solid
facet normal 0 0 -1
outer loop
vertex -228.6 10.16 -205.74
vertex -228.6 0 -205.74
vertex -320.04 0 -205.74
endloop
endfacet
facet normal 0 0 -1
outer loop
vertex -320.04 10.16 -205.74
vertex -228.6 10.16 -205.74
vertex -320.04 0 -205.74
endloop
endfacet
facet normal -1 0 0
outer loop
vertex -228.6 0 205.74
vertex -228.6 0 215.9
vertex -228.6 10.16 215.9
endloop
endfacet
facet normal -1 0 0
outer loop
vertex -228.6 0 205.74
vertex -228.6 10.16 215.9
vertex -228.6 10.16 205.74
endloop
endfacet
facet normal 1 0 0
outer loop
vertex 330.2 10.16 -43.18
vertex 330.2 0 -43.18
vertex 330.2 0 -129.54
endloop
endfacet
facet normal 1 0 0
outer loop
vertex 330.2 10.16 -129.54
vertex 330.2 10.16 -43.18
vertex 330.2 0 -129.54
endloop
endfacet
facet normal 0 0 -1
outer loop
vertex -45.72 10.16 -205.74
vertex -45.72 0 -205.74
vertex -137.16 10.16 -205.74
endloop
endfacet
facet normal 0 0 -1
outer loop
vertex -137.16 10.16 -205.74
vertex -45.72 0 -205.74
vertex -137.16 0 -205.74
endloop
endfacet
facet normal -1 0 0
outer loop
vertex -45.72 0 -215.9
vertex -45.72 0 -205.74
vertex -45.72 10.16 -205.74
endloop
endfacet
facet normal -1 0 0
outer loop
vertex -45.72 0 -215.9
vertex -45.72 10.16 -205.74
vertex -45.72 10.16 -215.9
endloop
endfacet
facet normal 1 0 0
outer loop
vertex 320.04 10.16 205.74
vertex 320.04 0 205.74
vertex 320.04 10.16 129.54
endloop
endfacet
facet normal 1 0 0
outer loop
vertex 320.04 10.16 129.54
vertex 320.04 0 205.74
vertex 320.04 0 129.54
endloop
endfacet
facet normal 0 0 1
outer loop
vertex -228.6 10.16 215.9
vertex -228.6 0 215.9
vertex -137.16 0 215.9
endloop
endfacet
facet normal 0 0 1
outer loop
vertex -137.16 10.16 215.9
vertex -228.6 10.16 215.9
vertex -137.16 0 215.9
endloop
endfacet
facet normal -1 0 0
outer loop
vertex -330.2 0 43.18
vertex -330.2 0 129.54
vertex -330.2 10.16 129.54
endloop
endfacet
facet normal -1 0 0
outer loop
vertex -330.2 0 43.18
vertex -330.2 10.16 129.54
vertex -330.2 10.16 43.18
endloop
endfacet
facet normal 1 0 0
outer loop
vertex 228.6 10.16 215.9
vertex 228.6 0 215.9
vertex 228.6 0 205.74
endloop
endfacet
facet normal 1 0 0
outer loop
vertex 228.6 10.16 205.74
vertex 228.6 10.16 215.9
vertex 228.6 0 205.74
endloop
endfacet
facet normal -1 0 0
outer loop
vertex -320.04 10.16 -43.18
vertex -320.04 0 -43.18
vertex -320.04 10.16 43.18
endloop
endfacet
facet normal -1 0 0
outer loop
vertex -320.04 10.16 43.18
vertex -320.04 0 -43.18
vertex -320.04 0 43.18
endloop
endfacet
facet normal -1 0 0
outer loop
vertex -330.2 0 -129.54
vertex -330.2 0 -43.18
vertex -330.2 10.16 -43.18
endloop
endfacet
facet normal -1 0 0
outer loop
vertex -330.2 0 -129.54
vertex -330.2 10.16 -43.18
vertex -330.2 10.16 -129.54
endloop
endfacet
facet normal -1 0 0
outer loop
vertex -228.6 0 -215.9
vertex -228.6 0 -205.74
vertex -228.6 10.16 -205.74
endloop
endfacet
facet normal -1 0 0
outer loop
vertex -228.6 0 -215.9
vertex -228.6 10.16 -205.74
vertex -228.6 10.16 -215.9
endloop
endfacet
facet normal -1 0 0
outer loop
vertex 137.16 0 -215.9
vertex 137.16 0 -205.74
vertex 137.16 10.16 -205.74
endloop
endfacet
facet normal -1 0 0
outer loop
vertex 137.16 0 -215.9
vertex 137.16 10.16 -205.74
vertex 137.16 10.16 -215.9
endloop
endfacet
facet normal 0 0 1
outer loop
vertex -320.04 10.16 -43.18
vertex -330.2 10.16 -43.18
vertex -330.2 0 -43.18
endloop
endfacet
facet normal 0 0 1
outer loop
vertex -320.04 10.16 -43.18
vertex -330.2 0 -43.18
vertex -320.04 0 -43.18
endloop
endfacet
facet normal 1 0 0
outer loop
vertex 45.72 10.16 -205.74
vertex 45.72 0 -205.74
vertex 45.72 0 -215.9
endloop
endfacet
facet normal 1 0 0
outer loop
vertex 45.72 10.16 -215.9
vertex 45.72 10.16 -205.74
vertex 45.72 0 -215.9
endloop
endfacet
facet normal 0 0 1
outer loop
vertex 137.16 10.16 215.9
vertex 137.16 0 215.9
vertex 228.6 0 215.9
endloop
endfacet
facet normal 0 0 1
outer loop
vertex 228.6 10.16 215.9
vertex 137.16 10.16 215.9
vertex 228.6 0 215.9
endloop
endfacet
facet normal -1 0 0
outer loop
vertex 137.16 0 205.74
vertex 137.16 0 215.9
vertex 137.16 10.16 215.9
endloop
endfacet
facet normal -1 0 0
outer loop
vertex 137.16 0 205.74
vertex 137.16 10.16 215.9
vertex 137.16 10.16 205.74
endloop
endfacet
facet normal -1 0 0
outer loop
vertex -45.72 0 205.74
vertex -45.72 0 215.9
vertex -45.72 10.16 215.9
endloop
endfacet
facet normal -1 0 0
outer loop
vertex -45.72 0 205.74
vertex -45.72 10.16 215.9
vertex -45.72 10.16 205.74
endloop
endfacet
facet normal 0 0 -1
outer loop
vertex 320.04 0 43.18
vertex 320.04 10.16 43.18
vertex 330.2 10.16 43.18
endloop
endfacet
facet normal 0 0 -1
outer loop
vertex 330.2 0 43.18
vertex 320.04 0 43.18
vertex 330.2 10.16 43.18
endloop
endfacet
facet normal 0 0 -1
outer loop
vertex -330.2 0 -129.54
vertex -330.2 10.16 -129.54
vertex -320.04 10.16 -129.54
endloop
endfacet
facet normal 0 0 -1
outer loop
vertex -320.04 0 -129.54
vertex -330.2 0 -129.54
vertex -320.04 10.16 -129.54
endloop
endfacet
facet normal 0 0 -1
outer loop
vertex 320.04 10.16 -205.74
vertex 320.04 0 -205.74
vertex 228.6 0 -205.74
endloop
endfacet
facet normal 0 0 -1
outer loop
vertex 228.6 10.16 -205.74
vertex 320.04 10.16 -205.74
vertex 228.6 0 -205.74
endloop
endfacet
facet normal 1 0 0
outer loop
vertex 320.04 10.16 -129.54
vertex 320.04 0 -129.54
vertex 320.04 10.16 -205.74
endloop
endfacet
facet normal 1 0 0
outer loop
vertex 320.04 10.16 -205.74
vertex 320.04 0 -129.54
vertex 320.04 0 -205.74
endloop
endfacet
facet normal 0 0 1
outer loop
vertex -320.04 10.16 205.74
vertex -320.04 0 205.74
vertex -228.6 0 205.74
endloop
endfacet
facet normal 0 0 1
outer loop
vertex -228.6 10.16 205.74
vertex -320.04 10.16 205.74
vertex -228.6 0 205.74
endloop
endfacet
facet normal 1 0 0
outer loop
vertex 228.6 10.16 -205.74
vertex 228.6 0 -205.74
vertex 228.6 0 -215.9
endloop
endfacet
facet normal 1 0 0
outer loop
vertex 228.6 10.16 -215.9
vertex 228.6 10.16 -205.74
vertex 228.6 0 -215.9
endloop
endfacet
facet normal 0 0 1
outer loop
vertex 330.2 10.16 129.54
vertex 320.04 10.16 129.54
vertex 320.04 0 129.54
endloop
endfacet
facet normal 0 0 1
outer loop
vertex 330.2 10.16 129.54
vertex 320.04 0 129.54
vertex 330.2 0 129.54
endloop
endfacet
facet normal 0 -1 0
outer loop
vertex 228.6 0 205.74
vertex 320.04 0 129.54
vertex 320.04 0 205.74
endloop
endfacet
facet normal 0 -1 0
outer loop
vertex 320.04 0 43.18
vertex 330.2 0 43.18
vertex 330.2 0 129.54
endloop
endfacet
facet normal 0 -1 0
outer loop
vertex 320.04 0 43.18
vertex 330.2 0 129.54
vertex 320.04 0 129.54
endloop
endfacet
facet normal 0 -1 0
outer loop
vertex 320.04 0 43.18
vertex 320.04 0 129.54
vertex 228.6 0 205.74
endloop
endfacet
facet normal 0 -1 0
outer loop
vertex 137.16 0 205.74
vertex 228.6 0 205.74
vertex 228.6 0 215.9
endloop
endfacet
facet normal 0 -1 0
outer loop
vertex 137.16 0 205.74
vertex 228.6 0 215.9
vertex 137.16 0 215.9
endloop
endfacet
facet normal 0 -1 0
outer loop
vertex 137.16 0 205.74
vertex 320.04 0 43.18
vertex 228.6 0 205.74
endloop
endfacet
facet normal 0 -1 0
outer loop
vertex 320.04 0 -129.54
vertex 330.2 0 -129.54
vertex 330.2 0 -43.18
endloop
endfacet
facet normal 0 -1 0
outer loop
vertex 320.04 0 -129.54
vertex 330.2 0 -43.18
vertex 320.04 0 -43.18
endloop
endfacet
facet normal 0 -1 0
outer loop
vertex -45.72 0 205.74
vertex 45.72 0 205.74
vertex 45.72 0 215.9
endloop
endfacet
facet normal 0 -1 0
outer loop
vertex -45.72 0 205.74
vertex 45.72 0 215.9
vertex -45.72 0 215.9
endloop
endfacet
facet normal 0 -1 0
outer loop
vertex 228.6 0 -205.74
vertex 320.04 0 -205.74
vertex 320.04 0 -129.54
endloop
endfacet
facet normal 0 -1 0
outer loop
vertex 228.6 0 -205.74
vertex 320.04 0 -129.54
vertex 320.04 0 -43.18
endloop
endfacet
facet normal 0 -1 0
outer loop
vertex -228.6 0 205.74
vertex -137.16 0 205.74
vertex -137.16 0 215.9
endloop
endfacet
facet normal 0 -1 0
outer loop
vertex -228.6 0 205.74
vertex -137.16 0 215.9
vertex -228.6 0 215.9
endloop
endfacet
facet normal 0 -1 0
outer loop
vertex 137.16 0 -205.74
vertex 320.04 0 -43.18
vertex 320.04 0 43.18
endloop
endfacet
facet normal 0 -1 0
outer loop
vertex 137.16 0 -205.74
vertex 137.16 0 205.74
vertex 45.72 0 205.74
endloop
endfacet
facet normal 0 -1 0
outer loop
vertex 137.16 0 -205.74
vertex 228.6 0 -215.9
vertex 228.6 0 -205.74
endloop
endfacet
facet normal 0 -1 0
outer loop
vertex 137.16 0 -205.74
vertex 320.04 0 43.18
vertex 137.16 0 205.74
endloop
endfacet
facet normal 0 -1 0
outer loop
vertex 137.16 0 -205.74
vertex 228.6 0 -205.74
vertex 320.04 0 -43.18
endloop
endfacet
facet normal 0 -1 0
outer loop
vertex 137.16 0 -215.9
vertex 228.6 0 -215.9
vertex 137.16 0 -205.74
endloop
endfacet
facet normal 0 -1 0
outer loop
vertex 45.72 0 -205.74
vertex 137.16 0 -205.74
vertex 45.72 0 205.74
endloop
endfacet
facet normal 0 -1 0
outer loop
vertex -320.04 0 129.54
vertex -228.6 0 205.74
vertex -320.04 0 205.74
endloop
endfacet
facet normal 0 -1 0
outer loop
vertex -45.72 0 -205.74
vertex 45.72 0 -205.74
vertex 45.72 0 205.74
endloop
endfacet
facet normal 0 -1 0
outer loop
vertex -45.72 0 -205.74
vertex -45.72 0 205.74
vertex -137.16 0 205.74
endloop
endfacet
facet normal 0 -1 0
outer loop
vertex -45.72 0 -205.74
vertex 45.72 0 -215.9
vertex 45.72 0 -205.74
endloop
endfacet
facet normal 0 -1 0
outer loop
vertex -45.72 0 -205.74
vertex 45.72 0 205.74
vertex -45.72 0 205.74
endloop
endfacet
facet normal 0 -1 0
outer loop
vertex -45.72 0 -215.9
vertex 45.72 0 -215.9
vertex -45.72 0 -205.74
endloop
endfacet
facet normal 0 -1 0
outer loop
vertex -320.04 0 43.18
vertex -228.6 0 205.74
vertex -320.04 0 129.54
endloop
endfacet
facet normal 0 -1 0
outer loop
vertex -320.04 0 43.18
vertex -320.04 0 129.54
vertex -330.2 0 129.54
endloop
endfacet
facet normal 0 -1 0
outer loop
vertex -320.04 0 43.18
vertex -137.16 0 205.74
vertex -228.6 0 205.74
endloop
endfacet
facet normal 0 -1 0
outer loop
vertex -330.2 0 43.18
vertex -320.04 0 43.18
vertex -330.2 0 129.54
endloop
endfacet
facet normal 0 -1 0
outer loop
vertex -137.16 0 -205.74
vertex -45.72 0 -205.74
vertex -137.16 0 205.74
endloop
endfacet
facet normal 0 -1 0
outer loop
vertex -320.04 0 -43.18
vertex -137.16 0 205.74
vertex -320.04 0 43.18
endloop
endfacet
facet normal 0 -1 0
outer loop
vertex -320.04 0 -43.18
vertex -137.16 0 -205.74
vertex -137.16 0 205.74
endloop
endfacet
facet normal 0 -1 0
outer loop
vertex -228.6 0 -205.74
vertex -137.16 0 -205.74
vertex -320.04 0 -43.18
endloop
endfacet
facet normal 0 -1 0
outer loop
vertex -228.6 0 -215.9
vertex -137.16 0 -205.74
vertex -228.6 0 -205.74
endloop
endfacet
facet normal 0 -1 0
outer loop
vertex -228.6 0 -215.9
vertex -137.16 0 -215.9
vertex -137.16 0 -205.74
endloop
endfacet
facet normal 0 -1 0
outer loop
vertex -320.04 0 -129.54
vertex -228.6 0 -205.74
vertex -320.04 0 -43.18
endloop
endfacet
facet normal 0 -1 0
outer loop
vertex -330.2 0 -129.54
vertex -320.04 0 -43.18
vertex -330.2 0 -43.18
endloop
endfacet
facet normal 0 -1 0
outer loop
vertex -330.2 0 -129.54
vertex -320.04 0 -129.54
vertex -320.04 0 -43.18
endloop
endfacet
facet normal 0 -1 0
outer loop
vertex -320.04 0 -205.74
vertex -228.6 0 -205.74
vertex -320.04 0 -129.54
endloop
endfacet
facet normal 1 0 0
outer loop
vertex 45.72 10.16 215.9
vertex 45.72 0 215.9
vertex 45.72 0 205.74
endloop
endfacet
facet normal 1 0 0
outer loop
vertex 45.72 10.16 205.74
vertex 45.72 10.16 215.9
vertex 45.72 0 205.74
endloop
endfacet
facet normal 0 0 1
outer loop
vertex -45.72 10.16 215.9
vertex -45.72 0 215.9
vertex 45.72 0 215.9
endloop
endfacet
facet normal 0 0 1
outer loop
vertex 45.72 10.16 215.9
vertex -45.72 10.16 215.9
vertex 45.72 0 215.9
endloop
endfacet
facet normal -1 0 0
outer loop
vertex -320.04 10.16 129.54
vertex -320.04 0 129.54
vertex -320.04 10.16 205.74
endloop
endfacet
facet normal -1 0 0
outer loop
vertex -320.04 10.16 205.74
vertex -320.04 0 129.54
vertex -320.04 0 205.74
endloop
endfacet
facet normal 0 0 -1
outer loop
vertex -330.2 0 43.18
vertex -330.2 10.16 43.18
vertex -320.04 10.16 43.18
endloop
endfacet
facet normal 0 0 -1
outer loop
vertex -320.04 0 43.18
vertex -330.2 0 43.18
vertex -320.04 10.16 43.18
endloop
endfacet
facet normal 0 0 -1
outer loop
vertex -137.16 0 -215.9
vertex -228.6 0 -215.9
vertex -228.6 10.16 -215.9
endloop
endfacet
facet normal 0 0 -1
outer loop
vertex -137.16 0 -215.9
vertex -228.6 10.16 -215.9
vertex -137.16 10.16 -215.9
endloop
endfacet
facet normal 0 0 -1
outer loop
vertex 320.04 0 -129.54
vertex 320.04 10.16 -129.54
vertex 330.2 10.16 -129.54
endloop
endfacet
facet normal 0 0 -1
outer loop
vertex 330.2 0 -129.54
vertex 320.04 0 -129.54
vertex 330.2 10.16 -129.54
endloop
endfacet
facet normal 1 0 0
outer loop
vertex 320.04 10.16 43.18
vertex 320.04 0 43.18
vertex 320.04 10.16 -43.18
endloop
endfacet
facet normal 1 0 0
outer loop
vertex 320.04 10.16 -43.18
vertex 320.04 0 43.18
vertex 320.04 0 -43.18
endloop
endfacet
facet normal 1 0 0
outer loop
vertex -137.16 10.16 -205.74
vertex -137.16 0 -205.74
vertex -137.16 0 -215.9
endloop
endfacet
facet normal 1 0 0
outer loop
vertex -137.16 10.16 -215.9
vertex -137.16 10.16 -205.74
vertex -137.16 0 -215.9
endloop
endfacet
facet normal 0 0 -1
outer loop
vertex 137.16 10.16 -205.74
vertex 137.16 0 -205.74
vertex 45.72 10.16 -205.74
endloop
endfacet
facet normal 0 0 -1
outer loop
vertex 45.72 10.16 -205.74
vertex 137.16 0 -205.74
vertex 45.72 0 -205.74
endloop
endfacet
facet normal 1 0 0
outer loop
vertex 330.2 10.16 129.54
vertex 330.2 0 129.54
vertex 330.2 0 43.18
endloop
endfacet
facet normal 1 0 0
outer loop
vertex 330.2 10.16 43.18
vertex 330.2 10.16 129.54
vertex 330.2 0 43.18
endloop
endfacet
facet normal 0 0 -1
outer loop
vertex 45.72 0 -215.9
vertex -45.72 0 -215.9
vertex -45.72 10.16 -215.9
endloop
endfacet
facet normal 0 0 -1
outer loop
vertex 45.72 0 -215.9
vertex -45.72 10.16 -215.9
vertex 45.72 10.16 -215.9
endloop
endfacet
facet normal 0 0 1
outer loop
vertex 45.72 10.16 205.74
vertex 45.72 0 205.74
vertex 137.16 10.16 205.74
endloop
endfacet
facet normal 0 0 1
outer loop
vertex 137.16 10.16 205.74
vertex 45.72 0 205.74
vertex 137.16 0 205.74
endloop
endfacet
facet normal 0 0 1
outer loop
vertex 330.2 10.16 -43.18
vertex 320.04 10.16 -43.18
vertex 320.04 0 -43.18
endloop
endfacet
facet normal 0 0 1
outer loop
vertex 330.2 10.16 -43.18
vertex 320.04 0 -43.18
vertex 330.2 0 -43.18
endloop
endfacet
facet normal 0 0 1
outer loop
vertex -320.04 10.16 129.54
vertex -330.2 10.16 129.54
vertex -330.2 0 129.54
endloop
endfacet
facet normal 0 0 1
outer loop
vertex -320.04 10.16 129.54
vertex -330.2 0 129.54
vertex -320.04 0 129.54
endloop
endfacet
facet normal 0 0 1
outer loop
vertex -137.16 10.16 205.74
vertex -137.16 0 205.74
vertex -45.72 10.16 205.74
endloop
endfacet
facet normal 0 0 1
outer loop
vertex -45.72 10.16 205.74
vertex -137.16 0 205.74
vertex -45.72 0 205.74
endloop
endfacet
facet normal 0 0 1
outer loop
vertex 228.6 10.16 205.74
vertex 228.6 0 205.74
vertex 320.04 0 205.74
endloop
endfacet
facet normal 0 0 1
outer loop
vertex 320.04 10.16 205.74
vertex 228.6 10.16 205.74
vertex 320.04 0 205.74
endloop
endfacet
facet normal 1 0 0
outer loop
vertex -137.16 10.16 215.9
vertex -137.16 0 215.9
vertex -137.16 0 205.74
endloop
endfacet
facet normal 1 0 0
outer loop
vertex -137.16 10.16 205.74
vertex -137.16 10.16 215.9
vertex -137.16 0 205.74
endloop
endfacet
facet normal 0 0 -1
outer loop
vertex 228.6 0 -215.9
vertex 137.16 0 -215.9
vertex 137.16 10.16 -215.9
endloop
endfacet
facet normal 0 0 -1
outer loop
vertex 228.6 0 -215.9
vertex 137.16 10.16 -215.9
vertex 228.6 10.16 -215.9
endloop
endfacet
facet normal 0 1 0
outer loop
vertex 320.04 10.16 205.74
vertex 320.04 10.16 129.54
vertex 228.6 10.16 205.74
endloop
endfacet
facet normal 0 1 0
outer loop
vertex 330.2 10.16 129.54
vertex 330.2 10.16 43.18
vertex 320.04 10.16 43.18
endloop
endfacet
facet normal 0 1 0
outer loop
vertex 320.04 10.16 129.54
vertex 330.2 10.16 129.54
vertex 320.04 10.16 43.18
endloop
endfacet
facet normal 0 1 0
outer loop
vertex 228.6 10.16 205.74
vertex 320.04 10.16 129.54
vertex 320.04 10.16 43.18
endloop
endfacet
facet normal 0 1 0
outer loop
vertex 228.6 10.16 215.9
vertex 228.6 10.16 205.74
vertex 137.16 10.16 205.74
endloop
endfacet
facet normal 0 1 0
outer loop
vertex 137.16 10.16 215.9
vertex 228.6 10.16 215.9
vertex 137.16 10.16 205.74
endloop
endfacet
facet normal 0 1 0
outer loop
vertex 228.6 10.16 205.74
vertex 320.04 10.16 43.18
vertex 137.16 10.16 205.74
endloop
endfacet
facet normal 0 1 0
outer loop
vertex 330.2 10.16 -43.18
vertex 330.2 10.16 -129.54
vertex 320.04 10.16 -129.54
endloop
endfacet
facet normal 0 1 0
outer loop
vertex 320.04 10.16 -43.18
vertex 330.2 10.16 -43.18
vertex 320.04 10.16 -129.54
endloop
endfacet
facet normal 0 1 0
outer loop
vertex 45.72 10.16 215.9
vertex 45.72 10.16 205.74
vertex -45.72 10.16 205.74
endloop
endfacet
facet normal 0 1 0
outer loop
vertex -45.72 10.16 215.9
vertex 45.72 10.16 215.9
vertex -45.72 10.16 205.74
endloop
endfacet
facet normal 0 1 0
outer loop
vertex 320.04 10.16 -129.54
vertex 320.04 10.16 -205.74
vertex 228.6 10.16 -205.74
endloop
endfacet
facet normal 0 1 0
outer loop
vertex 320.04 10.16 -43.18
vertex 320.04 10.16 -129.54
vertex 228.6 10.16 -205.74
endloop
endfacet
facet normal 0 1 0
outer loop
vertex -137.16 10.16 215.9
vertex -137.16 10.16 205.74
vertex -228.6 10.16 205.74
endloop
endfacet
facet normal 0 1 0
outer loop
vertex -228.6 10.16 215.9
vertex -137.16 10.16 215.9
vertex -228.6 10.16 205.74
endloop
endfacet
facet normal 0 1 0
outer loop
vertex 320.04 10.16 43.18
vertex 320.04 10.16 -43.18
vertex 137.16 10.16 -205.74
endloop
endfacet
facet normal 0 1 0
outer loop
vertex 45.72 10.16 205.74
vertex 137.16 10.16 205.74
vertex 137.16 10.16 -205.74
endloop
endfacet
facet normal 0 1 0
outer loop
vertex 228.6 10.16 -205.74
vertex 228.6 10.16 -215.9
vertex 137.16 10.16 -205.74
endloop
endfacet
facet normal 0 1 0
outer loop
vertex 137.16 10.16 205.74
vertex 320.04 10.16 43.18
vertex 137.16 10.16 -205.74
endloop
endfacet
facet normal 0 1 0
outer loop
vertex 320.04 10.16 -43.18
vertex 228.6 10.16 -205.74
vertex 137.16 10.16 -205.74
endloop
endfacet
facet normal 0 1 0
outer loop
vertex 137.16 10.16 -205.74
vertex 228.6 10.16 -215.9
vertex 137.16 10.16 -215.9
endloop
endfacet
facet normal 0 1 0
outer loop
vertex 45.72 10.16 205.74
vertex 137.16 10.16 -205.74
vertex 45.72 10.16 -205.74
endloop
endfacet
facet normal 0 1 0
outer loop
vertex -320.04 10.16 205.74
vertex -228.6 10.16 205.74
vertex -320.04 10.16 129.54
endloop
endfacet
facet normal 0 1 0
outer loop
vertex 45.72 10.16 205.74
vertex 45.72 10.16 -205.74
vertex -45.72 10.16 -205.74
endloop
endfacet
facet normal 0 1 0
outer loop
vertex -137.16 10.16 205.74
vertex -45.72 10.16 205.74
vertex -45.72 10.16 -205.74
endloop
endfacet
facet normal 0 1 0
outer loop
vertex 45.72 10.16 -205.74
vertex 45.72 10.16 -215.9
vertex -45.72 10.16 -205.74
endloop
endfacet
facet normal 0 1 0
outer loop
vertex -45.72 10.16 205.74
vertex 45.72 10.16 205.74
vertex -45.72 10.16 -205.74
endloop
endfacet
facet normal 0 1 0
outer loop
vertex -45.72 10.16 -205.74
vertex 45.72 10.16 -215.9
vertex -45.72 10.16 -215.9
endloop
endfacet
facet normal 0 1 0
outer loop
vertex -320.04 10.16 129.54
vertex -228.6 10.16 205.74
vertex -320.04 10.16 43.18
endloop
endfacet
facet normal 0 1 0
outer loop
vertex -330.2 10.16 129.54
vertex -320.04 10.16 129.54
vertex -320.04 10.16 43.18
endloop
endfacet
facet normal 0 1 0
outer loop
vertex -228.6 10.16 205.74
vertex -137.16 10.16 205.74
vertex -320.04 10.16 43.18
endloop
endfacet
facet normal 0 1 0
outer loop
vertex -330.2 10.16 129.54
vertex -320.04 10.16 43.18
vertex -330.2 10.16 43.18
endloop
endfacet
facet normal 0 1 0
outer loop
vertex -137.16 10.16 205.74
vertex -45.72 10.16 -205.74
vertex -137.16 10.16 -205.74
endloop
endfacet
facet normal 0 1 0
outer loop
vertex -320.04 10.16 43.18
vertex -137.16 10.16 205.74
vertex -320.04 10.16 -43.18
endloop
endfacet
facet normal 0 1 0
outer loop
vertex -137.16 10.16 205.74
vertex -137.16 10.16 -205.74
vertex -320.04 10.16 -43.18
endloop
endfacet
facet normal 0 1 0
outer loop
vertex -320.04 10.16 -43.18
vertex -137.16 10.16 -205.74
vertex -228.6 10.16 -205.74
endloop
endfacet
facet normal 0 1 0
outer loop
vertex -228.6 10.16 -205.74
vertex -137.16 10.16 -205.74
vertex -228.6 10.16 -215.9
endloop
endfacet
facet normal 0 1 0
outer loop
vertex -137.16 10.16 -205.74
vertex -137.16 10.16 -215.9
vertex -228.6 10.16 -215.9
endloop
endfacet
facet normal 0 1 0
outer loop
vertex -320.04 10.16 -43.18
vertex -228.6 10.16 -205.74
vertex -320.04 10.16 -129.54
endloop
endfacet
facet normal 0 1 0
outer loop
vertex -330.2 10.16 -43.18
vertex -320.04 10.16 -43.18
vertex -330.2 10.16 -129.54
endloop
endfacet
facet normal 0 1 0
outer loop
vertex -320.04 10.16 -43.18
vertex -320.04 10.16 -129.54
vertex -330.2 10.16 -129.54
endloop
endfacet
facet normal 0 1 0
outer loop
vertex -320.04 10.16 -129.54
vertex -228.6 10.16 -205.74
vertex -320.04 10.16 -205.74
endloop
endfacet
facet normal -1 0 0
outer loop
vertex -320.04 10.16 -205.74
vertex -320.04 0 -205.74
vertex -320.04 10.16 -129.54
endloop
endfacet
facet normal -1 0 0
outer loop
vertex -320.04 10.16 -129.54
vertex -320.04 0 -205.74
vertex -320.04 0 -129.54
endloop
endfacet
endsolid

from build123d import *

# Parameters (mm, degrees)
SKETCH1_W           = 10.16
SKETCH1_H           = 86.36
SKETCH1_W_2         = 91.44
SKETCH1_H_2         = 10.16
BOSS_EXTRUDE1_DEPTH = 10.16


with BuildPart() as part:
    # Sketch1 → Boss-Extrude1 (new body)
    with BuildSketch(Plane(origin=(0, 0, 0), x_dir=(1, 0, 0), z_dir=(0, 1, 0))):
        Polygon((-228.6, 205.74), (-137.16, 205.74), (-45.72, 205.74), (45.72, 205.74), (137.16, 205.74), (228.6, 205.74), (320.04, 205.74), (320.04, 129.54), (320.04, 43.18), (320.04, -43.18), (320.04, -129.54), (320.04, -205.74), (228.6, -205.74), (137.16, -205.74), (45.72, -205.74), (-45.72, -205.74), (-137.16, -205.74), (-228.6, -205.74), (-320.04, -205.74), (-320.04, -129.54), (-320.04, -43.18), (-320.04, 43.18), (-320.04, 129.54), (-320.04, 205.74), align=None)
        with Locations((-325.12, 86.36)):
            Rectangle(SKETCH1_W, SKETCH1_H)
        with Locations((-325.12, -86.36)):
            Rectangle(SKETCH1_W, SKETCH1_H)
        with Locations((-182.88, -210.82)):
            Rectangle(SKETCH1_W_2, SKETCH1_H_2)
        with Locations((0, -210.82)):
            Rectangle(SKETCH1_W_2, SKETCH1_H_2)
        with Locations((182.88, -210.82)):
            Rectangle(SKETCH1_W_2, SKETCH1_H_2)
        with Locations((325.12, -86.36)):
            Rectangle(SKETCH1_W, SKETCH1_H)
        with Locations((325.12, 86.36)):
            Rectangle(SKETCH1_W, SKETCH1_H)
        with Locations((-182.88, 210.82)):
            Rectangle(SKETCH1_W_2, SKETCH1_H_2)
        with Locations((0, 210.82)):
            Rectangle(SKETCH1_W_2, SKETCH1_H_2)
        with Locations((182.88, 210.82)):
            Rectangle(SKETCH1_W_2, SKETCH1_H_2)
    extrude(amount=BOSS_EXTRUDE1_DEPTH)


solid = part.part
